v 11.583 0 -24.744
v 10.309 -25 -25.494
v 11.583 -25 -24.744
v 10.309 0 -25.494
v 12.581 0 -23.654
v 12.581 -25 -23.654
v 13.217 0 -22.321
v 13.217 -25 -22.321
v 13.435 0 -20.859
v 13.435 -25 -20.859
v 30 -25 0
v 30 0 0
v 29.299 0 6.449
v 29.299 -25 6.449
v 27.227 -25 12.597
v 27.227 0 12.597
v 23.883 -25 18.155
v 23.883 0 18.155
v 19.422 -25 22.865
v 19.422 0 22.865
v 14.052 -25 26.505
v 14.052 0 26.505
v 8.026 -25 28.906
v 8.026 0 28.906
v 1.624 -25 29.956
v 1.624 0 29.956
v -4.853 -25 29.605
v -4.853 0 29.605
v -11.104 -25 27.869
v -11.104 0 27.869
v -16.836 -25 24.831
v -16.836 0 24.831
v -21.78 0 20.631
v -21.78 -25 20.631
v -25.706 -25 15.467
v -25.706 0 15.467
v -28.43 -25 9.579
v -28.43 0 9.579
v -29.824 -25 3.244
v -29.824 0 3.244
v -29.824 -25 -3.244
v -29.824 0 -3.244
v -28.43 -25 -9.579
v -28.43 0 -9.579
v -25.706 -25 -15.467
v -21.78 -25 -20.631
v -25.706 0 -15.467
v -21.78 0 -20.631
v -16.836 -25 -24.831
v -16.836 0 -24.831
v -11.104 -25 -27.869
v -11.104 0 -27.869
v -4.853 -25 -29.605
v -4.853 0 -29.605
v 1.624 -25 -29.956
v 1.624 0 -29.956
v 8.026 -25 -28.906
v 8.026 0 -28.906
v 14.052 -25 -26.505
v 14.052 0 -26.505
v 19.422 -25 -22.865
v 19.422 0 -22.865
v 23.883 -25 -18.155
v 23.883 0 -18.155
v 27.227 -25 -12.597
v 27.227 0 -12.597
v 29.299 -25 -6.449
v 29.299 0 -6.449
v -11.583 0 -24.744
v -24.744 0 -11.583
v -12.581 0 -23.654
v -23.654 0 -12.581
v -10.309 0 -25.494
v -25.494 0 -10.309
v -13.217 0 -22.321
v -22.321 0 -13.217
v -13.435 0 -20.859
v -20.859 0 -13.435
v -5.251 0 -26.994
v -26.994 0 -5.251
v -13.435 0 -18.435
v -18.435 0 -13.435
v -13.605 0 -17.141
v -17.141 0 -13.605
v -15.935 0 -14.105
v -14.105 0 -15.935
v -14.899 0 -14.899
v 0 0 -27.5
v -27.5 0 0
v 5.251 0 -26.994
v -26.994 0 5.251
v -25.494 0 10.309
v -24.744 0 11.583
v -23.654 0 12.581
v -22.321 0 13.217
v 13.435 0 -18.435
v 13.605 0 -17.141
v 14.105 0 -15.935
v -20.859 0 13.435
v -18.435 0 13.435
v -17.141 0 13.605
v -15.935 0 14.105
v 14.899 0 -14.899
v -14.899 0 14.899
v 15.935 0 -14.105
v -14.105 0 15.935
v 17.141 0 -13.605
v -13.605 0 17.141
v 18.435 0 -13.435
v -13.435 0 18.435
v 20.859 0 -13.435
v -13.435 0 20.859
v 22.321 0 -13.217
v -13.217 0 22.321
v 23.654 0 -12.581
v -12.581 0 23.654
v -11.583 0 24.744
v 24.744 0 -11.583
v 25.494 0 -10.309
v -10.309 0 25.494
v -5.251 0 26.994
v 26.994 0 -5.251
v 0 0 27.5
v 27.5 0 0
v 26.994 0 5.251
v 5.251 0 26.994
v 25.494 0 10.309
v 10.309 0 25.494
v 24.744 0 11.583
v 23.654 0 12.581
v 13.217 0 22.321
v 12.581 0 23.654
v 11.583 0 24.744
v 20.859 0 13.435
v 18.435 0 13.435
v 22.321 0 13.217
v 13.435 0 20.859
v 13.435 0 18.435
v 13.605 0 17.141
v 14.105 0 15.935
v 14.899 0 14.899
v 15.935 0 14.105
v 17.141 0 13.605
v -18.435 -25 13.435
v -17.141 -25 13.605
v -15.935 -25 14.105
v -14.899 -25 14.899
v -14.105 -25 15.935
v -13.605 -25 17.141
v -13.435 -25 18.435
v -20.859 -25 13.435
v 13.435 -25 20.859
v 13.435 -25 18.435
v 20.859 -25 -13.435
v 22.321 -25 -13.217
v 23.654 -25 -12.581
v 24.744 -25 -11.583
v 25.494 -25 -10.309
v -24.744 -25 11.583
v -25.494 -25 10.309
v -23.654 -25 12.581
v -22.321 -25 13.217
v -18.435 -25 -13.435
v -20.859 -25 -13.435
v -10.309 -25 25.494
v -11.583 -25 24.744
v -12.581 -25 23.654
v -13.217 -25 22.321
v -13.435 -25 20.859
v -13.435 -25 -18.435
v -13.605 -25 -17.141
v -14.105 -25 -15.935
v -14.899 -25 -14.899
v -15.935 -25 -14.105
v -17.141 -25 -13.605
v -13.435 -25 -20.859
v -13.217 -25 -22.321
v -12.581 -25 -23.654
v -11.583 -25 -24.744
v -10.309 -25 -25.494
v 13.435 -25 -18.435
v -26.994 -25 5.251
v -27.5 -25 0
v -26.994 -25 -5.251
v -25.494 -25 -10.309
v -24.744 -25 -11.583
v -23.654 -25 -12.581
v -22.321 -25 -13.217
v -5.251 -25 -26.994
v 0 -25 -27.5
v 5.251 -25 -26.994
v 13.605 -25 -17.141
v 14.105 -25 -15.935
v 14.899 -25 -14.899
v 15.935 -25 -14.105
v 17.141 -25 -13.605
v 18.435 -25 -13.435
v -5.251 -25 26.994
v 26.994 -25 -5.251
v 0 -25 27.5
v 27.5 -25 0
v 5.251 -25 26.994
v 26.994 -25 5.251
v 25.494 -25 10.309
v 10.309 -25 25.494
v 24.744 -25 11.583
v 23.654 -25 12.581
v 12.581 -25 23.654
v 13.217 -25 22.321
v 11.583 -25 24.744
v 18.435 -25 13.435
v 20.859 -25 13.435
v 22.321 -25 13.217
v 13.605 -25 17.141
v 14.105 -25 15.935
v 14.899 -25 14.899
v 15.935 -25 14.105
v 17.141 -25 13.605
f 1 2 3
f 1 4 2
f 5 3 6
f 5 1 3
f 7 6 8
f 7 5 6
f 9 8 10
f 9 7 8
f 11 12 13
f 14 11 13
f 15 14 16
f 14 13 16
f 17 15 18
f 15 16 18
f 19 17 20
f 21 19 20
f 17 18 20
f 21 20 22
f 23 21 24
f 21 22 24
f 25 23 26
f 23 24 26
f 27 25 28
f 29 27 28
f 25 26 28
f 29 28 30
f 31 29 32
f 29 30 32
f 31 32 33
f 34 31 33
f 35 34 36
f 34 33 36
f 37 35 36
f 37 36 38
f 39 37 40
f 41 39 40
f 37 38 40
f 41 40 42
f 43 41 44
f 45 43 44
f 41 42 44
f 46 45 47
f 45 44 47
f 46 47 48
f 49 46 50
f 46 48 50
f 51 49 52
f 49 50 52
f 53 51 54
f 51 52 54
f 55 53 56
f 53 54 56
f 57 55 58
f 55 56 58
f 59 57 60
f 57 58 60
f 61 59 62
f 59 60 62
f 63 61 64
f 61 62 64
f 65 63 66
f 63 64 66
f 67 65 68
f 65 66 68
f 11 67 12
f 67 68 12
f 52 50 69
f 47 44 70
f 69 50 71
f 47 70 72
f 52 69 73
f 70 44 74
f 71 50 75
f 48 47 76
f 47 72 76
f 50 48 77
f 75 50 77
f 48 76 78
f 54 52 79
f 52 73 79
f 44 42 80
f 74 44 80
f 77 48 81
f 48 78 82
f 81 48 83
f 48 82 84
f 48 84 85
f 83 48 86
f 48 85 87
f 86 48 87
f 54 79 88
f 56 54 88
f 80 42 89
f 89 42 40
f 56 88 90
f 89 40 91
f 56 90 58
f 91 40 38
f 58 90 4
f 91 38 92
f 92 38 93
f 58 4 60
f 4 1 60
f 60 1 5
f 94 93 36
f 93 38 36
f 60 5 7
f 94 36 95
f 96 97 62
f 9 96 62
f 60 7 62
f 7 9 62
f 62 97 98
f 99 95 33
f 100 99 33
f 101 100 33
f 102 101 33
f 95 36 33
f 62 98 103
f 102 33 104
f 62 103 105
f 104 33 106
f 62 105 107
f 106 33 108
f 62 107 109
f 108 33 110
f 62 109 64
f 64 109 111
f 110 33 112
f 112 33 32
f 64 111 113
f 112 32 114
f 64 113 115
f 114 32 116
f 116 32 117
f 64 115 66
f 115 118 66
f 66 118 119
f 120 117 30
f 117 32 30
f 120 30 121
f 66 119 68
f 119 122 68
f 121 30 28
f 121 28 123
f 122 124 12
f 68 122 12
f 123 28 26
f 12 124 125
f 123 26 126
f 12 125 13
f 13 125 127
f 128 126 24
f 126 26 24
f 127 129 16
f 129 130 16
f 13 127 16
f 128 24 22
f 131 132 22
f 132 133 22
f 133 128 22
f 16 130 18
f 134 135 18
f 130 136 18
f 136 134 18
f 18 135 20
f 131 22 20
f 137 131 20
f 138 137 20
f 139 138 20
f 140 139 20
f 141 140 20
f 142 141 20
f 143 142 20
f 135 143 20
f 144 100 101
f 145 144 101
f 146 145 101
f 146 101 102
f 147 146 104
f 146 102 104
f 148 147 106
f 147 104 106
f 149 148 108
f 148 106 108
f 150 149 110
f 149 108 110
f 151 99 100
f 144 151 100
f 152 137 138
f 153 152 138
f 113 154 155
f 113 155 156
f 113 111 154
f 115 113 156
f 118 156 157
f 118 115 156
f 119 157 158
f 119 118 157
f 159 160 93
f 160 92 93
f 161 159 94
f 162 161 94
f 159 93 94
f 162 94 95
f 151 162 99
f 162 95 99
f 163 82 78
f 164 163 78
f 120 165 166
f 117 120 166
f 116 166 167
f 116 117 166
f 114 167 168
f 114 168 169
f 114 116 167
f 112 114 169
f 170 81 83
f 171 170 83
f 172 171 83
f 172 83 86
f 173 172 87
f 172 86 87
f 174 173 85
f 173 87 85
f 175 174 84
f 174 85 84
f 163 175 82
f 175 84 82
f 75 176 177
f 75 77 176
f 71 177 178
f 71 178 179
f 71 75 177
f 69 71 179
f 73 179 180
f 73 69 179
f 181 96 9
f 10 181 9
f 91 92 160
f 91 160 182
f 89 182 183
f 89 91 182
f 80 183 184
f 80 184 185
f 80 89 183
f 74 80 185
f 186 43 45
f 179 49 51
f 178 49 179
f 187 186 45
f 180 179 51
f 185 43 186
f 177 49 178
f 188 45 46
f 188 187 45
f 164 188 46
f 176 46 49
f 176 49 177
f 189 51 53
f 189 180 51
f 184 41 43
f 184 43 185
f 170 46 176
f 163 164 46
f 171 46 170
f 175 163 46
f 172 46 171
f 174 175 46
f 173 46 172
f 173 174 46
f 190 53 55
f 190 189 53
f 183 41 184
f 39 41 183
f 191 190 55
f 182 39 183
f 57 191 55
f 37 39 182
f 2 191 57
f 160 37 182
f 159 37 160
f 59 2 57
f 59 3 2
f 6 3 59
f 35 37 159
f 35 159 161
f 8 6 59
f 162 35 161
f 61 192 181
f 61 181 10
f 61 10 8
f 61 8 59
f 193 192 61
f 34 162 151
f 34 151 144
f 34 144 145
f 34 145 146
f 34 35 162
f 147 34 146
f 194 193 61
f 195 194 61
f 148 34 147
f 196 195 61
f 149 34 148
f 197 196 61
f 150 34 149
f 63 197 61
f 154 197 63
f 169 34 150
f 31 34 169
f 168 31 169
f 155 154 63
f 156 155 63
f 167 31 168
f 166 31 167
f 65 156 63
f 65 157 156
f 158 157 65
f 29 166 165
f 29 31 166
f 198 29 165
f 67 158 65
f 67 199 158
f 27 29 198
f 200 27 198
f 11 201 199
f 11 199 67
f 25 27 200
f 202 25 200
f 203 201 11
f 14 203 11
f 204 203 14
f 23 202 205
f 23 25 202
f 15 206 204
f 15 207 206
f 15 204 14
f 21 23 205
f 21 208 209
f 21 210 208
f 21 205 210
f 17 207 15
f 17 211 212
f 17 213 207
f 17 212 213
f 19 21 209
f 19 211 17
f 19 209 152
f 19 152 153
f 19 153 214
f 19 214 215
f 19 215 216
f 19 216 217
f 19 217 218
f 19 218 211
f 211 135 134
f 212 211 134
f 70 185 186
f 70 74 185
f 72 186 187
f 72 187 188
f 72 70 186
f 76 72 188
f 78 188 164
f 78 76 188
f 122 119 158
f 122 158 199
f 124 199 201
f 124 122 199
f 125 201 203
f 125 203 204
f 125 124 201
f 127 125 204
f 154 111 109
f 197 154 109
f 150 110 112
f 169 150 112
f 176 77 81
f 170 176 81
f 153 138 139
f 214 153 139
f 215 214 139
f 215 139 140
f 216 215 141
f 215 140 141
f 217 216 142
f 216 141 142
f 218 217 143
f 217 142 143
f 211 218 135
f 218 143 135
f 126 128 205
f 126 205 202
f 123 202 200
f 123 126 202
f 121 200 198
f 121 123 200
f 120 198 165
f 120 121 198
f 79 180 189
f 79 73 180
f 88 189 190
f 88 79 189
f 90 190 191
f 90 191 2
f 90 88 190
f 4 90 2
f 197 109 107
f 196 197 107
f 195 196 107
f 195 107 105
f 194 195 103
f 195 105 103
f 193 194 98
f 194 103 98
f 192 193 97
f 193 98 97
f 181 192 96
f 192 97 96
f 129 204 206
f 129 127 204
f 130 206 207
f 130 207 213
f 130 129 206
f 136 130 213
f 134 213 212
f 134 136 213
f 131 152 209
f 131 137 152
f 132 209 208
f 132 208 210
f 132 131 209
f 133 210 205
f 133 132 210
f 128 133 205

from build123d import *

# Parameters (mm, degrees)
F0_R     = 30
F0_R_2   = 27.5
F1_DEPTH = 25
F3_DEPTH = 25
F4_R     = 5


with BuildPart() as f1:
    # F0 (on Front) → F1 (new body)
    with BuildSketch(Plane.XZ):
        Circle(F0_R)
        Circle(F0_R_2, mode=Mode.SUBTRACT)
    extrude(amount=F1_DEPTH)

    # F2 (on Front) → F3 (join)
    with BuildSketch(Plane.XZ):
        with BuildLine():
            Line((-24.4350288425, 13.4350288425), (-18.4350288425, 13.4350288425))
            ThreePointArc((-18.4350288425, 13.4350288425), (-14.8994949366, 14.8994949366), (-13.4350288425, 18.4350288425))
            Line((-13.4350288425, 18.4350288425), (-13.4350288425, 24.4350288425))
            ThreePointArc((-13.4350288425, 24.4350288425), (-19.7176397489, 19.7176397489), (-24.4350288425, 13.4350288425))
        make_face()
        with BuildLine():
            ThreePointArc((18.4350288425, -13.4350288425), (14.8994949366, -14.8994949366), (13.4350288425, -18.4350288425))
            Line((13.4350288425, -18.4350288425), (13.4350288425, -24.4350288425))
            ThreePointArc((13.4350288425, -24.4350288425), (19.7176397489, -19.7176397489), (24.4350288425, -13.4350288425))
            Line((24.4350288425, -13.4350288425), (18.4350288425, -13.4350288425))
        make_face()
        with BuildLine():
            ThreePointArc((13.4350288425, 18.4350288425), (14.8994949366, 14.8994949366), (18.4350288425, 13.4350288425))
            Line((18.4350288425, 13.4350288425), (24.4350288425, 13.4350288425))
            ThreePointArc((24.4350288425, 13.4350288425), (19.7176397489, 19.7176397489), (13.4350288425, 24.4350288425))
            Line((13.4350288425, 24.4350288425), (13.4350288425, 18.4350288425))
        make_face()
        with BuildLine():
            Line((-13.4350288425, -24.4350288425), (-13.4350288425, -18.4350288425))
            ThreePointArc((-13.4350288425, -18.4350288425), (-14.8994949366, -14.8994949366), (-18.4350288425, -13.4350288425))
            Line((-18.4350288425, -13.4350288425), (-24.4350288425, -13.4350288425))
            ThreePointArc((-24.4350288425, -13.4350288425), (-19.7176397489, -19.7176397489), (-13.4350288425, -24.4350288425))
        make_face()
    extrude(amount=F3_DEPTH)

    # F4
    f4_edges = [f1.edges().sort_by_distance(p)[0] for p in [
        (-13.435029, -12.5, 23.994791),
        (-23.994791, -12.5, 13.435029),
        (-23.994791, -12.5, -13.435029),
        (-13.435029, -12.5, -23.994791),
        (13.435029, -12.5, 23.994791),
        (23.994791, -12.5, 13.435029),
        (13.435029, -12.5, -23.994791),
        (23.994791, -12.5, -13.435029),
    ]]
    fillet(f4_edges, radius=F4_R)


solid = f1.part
